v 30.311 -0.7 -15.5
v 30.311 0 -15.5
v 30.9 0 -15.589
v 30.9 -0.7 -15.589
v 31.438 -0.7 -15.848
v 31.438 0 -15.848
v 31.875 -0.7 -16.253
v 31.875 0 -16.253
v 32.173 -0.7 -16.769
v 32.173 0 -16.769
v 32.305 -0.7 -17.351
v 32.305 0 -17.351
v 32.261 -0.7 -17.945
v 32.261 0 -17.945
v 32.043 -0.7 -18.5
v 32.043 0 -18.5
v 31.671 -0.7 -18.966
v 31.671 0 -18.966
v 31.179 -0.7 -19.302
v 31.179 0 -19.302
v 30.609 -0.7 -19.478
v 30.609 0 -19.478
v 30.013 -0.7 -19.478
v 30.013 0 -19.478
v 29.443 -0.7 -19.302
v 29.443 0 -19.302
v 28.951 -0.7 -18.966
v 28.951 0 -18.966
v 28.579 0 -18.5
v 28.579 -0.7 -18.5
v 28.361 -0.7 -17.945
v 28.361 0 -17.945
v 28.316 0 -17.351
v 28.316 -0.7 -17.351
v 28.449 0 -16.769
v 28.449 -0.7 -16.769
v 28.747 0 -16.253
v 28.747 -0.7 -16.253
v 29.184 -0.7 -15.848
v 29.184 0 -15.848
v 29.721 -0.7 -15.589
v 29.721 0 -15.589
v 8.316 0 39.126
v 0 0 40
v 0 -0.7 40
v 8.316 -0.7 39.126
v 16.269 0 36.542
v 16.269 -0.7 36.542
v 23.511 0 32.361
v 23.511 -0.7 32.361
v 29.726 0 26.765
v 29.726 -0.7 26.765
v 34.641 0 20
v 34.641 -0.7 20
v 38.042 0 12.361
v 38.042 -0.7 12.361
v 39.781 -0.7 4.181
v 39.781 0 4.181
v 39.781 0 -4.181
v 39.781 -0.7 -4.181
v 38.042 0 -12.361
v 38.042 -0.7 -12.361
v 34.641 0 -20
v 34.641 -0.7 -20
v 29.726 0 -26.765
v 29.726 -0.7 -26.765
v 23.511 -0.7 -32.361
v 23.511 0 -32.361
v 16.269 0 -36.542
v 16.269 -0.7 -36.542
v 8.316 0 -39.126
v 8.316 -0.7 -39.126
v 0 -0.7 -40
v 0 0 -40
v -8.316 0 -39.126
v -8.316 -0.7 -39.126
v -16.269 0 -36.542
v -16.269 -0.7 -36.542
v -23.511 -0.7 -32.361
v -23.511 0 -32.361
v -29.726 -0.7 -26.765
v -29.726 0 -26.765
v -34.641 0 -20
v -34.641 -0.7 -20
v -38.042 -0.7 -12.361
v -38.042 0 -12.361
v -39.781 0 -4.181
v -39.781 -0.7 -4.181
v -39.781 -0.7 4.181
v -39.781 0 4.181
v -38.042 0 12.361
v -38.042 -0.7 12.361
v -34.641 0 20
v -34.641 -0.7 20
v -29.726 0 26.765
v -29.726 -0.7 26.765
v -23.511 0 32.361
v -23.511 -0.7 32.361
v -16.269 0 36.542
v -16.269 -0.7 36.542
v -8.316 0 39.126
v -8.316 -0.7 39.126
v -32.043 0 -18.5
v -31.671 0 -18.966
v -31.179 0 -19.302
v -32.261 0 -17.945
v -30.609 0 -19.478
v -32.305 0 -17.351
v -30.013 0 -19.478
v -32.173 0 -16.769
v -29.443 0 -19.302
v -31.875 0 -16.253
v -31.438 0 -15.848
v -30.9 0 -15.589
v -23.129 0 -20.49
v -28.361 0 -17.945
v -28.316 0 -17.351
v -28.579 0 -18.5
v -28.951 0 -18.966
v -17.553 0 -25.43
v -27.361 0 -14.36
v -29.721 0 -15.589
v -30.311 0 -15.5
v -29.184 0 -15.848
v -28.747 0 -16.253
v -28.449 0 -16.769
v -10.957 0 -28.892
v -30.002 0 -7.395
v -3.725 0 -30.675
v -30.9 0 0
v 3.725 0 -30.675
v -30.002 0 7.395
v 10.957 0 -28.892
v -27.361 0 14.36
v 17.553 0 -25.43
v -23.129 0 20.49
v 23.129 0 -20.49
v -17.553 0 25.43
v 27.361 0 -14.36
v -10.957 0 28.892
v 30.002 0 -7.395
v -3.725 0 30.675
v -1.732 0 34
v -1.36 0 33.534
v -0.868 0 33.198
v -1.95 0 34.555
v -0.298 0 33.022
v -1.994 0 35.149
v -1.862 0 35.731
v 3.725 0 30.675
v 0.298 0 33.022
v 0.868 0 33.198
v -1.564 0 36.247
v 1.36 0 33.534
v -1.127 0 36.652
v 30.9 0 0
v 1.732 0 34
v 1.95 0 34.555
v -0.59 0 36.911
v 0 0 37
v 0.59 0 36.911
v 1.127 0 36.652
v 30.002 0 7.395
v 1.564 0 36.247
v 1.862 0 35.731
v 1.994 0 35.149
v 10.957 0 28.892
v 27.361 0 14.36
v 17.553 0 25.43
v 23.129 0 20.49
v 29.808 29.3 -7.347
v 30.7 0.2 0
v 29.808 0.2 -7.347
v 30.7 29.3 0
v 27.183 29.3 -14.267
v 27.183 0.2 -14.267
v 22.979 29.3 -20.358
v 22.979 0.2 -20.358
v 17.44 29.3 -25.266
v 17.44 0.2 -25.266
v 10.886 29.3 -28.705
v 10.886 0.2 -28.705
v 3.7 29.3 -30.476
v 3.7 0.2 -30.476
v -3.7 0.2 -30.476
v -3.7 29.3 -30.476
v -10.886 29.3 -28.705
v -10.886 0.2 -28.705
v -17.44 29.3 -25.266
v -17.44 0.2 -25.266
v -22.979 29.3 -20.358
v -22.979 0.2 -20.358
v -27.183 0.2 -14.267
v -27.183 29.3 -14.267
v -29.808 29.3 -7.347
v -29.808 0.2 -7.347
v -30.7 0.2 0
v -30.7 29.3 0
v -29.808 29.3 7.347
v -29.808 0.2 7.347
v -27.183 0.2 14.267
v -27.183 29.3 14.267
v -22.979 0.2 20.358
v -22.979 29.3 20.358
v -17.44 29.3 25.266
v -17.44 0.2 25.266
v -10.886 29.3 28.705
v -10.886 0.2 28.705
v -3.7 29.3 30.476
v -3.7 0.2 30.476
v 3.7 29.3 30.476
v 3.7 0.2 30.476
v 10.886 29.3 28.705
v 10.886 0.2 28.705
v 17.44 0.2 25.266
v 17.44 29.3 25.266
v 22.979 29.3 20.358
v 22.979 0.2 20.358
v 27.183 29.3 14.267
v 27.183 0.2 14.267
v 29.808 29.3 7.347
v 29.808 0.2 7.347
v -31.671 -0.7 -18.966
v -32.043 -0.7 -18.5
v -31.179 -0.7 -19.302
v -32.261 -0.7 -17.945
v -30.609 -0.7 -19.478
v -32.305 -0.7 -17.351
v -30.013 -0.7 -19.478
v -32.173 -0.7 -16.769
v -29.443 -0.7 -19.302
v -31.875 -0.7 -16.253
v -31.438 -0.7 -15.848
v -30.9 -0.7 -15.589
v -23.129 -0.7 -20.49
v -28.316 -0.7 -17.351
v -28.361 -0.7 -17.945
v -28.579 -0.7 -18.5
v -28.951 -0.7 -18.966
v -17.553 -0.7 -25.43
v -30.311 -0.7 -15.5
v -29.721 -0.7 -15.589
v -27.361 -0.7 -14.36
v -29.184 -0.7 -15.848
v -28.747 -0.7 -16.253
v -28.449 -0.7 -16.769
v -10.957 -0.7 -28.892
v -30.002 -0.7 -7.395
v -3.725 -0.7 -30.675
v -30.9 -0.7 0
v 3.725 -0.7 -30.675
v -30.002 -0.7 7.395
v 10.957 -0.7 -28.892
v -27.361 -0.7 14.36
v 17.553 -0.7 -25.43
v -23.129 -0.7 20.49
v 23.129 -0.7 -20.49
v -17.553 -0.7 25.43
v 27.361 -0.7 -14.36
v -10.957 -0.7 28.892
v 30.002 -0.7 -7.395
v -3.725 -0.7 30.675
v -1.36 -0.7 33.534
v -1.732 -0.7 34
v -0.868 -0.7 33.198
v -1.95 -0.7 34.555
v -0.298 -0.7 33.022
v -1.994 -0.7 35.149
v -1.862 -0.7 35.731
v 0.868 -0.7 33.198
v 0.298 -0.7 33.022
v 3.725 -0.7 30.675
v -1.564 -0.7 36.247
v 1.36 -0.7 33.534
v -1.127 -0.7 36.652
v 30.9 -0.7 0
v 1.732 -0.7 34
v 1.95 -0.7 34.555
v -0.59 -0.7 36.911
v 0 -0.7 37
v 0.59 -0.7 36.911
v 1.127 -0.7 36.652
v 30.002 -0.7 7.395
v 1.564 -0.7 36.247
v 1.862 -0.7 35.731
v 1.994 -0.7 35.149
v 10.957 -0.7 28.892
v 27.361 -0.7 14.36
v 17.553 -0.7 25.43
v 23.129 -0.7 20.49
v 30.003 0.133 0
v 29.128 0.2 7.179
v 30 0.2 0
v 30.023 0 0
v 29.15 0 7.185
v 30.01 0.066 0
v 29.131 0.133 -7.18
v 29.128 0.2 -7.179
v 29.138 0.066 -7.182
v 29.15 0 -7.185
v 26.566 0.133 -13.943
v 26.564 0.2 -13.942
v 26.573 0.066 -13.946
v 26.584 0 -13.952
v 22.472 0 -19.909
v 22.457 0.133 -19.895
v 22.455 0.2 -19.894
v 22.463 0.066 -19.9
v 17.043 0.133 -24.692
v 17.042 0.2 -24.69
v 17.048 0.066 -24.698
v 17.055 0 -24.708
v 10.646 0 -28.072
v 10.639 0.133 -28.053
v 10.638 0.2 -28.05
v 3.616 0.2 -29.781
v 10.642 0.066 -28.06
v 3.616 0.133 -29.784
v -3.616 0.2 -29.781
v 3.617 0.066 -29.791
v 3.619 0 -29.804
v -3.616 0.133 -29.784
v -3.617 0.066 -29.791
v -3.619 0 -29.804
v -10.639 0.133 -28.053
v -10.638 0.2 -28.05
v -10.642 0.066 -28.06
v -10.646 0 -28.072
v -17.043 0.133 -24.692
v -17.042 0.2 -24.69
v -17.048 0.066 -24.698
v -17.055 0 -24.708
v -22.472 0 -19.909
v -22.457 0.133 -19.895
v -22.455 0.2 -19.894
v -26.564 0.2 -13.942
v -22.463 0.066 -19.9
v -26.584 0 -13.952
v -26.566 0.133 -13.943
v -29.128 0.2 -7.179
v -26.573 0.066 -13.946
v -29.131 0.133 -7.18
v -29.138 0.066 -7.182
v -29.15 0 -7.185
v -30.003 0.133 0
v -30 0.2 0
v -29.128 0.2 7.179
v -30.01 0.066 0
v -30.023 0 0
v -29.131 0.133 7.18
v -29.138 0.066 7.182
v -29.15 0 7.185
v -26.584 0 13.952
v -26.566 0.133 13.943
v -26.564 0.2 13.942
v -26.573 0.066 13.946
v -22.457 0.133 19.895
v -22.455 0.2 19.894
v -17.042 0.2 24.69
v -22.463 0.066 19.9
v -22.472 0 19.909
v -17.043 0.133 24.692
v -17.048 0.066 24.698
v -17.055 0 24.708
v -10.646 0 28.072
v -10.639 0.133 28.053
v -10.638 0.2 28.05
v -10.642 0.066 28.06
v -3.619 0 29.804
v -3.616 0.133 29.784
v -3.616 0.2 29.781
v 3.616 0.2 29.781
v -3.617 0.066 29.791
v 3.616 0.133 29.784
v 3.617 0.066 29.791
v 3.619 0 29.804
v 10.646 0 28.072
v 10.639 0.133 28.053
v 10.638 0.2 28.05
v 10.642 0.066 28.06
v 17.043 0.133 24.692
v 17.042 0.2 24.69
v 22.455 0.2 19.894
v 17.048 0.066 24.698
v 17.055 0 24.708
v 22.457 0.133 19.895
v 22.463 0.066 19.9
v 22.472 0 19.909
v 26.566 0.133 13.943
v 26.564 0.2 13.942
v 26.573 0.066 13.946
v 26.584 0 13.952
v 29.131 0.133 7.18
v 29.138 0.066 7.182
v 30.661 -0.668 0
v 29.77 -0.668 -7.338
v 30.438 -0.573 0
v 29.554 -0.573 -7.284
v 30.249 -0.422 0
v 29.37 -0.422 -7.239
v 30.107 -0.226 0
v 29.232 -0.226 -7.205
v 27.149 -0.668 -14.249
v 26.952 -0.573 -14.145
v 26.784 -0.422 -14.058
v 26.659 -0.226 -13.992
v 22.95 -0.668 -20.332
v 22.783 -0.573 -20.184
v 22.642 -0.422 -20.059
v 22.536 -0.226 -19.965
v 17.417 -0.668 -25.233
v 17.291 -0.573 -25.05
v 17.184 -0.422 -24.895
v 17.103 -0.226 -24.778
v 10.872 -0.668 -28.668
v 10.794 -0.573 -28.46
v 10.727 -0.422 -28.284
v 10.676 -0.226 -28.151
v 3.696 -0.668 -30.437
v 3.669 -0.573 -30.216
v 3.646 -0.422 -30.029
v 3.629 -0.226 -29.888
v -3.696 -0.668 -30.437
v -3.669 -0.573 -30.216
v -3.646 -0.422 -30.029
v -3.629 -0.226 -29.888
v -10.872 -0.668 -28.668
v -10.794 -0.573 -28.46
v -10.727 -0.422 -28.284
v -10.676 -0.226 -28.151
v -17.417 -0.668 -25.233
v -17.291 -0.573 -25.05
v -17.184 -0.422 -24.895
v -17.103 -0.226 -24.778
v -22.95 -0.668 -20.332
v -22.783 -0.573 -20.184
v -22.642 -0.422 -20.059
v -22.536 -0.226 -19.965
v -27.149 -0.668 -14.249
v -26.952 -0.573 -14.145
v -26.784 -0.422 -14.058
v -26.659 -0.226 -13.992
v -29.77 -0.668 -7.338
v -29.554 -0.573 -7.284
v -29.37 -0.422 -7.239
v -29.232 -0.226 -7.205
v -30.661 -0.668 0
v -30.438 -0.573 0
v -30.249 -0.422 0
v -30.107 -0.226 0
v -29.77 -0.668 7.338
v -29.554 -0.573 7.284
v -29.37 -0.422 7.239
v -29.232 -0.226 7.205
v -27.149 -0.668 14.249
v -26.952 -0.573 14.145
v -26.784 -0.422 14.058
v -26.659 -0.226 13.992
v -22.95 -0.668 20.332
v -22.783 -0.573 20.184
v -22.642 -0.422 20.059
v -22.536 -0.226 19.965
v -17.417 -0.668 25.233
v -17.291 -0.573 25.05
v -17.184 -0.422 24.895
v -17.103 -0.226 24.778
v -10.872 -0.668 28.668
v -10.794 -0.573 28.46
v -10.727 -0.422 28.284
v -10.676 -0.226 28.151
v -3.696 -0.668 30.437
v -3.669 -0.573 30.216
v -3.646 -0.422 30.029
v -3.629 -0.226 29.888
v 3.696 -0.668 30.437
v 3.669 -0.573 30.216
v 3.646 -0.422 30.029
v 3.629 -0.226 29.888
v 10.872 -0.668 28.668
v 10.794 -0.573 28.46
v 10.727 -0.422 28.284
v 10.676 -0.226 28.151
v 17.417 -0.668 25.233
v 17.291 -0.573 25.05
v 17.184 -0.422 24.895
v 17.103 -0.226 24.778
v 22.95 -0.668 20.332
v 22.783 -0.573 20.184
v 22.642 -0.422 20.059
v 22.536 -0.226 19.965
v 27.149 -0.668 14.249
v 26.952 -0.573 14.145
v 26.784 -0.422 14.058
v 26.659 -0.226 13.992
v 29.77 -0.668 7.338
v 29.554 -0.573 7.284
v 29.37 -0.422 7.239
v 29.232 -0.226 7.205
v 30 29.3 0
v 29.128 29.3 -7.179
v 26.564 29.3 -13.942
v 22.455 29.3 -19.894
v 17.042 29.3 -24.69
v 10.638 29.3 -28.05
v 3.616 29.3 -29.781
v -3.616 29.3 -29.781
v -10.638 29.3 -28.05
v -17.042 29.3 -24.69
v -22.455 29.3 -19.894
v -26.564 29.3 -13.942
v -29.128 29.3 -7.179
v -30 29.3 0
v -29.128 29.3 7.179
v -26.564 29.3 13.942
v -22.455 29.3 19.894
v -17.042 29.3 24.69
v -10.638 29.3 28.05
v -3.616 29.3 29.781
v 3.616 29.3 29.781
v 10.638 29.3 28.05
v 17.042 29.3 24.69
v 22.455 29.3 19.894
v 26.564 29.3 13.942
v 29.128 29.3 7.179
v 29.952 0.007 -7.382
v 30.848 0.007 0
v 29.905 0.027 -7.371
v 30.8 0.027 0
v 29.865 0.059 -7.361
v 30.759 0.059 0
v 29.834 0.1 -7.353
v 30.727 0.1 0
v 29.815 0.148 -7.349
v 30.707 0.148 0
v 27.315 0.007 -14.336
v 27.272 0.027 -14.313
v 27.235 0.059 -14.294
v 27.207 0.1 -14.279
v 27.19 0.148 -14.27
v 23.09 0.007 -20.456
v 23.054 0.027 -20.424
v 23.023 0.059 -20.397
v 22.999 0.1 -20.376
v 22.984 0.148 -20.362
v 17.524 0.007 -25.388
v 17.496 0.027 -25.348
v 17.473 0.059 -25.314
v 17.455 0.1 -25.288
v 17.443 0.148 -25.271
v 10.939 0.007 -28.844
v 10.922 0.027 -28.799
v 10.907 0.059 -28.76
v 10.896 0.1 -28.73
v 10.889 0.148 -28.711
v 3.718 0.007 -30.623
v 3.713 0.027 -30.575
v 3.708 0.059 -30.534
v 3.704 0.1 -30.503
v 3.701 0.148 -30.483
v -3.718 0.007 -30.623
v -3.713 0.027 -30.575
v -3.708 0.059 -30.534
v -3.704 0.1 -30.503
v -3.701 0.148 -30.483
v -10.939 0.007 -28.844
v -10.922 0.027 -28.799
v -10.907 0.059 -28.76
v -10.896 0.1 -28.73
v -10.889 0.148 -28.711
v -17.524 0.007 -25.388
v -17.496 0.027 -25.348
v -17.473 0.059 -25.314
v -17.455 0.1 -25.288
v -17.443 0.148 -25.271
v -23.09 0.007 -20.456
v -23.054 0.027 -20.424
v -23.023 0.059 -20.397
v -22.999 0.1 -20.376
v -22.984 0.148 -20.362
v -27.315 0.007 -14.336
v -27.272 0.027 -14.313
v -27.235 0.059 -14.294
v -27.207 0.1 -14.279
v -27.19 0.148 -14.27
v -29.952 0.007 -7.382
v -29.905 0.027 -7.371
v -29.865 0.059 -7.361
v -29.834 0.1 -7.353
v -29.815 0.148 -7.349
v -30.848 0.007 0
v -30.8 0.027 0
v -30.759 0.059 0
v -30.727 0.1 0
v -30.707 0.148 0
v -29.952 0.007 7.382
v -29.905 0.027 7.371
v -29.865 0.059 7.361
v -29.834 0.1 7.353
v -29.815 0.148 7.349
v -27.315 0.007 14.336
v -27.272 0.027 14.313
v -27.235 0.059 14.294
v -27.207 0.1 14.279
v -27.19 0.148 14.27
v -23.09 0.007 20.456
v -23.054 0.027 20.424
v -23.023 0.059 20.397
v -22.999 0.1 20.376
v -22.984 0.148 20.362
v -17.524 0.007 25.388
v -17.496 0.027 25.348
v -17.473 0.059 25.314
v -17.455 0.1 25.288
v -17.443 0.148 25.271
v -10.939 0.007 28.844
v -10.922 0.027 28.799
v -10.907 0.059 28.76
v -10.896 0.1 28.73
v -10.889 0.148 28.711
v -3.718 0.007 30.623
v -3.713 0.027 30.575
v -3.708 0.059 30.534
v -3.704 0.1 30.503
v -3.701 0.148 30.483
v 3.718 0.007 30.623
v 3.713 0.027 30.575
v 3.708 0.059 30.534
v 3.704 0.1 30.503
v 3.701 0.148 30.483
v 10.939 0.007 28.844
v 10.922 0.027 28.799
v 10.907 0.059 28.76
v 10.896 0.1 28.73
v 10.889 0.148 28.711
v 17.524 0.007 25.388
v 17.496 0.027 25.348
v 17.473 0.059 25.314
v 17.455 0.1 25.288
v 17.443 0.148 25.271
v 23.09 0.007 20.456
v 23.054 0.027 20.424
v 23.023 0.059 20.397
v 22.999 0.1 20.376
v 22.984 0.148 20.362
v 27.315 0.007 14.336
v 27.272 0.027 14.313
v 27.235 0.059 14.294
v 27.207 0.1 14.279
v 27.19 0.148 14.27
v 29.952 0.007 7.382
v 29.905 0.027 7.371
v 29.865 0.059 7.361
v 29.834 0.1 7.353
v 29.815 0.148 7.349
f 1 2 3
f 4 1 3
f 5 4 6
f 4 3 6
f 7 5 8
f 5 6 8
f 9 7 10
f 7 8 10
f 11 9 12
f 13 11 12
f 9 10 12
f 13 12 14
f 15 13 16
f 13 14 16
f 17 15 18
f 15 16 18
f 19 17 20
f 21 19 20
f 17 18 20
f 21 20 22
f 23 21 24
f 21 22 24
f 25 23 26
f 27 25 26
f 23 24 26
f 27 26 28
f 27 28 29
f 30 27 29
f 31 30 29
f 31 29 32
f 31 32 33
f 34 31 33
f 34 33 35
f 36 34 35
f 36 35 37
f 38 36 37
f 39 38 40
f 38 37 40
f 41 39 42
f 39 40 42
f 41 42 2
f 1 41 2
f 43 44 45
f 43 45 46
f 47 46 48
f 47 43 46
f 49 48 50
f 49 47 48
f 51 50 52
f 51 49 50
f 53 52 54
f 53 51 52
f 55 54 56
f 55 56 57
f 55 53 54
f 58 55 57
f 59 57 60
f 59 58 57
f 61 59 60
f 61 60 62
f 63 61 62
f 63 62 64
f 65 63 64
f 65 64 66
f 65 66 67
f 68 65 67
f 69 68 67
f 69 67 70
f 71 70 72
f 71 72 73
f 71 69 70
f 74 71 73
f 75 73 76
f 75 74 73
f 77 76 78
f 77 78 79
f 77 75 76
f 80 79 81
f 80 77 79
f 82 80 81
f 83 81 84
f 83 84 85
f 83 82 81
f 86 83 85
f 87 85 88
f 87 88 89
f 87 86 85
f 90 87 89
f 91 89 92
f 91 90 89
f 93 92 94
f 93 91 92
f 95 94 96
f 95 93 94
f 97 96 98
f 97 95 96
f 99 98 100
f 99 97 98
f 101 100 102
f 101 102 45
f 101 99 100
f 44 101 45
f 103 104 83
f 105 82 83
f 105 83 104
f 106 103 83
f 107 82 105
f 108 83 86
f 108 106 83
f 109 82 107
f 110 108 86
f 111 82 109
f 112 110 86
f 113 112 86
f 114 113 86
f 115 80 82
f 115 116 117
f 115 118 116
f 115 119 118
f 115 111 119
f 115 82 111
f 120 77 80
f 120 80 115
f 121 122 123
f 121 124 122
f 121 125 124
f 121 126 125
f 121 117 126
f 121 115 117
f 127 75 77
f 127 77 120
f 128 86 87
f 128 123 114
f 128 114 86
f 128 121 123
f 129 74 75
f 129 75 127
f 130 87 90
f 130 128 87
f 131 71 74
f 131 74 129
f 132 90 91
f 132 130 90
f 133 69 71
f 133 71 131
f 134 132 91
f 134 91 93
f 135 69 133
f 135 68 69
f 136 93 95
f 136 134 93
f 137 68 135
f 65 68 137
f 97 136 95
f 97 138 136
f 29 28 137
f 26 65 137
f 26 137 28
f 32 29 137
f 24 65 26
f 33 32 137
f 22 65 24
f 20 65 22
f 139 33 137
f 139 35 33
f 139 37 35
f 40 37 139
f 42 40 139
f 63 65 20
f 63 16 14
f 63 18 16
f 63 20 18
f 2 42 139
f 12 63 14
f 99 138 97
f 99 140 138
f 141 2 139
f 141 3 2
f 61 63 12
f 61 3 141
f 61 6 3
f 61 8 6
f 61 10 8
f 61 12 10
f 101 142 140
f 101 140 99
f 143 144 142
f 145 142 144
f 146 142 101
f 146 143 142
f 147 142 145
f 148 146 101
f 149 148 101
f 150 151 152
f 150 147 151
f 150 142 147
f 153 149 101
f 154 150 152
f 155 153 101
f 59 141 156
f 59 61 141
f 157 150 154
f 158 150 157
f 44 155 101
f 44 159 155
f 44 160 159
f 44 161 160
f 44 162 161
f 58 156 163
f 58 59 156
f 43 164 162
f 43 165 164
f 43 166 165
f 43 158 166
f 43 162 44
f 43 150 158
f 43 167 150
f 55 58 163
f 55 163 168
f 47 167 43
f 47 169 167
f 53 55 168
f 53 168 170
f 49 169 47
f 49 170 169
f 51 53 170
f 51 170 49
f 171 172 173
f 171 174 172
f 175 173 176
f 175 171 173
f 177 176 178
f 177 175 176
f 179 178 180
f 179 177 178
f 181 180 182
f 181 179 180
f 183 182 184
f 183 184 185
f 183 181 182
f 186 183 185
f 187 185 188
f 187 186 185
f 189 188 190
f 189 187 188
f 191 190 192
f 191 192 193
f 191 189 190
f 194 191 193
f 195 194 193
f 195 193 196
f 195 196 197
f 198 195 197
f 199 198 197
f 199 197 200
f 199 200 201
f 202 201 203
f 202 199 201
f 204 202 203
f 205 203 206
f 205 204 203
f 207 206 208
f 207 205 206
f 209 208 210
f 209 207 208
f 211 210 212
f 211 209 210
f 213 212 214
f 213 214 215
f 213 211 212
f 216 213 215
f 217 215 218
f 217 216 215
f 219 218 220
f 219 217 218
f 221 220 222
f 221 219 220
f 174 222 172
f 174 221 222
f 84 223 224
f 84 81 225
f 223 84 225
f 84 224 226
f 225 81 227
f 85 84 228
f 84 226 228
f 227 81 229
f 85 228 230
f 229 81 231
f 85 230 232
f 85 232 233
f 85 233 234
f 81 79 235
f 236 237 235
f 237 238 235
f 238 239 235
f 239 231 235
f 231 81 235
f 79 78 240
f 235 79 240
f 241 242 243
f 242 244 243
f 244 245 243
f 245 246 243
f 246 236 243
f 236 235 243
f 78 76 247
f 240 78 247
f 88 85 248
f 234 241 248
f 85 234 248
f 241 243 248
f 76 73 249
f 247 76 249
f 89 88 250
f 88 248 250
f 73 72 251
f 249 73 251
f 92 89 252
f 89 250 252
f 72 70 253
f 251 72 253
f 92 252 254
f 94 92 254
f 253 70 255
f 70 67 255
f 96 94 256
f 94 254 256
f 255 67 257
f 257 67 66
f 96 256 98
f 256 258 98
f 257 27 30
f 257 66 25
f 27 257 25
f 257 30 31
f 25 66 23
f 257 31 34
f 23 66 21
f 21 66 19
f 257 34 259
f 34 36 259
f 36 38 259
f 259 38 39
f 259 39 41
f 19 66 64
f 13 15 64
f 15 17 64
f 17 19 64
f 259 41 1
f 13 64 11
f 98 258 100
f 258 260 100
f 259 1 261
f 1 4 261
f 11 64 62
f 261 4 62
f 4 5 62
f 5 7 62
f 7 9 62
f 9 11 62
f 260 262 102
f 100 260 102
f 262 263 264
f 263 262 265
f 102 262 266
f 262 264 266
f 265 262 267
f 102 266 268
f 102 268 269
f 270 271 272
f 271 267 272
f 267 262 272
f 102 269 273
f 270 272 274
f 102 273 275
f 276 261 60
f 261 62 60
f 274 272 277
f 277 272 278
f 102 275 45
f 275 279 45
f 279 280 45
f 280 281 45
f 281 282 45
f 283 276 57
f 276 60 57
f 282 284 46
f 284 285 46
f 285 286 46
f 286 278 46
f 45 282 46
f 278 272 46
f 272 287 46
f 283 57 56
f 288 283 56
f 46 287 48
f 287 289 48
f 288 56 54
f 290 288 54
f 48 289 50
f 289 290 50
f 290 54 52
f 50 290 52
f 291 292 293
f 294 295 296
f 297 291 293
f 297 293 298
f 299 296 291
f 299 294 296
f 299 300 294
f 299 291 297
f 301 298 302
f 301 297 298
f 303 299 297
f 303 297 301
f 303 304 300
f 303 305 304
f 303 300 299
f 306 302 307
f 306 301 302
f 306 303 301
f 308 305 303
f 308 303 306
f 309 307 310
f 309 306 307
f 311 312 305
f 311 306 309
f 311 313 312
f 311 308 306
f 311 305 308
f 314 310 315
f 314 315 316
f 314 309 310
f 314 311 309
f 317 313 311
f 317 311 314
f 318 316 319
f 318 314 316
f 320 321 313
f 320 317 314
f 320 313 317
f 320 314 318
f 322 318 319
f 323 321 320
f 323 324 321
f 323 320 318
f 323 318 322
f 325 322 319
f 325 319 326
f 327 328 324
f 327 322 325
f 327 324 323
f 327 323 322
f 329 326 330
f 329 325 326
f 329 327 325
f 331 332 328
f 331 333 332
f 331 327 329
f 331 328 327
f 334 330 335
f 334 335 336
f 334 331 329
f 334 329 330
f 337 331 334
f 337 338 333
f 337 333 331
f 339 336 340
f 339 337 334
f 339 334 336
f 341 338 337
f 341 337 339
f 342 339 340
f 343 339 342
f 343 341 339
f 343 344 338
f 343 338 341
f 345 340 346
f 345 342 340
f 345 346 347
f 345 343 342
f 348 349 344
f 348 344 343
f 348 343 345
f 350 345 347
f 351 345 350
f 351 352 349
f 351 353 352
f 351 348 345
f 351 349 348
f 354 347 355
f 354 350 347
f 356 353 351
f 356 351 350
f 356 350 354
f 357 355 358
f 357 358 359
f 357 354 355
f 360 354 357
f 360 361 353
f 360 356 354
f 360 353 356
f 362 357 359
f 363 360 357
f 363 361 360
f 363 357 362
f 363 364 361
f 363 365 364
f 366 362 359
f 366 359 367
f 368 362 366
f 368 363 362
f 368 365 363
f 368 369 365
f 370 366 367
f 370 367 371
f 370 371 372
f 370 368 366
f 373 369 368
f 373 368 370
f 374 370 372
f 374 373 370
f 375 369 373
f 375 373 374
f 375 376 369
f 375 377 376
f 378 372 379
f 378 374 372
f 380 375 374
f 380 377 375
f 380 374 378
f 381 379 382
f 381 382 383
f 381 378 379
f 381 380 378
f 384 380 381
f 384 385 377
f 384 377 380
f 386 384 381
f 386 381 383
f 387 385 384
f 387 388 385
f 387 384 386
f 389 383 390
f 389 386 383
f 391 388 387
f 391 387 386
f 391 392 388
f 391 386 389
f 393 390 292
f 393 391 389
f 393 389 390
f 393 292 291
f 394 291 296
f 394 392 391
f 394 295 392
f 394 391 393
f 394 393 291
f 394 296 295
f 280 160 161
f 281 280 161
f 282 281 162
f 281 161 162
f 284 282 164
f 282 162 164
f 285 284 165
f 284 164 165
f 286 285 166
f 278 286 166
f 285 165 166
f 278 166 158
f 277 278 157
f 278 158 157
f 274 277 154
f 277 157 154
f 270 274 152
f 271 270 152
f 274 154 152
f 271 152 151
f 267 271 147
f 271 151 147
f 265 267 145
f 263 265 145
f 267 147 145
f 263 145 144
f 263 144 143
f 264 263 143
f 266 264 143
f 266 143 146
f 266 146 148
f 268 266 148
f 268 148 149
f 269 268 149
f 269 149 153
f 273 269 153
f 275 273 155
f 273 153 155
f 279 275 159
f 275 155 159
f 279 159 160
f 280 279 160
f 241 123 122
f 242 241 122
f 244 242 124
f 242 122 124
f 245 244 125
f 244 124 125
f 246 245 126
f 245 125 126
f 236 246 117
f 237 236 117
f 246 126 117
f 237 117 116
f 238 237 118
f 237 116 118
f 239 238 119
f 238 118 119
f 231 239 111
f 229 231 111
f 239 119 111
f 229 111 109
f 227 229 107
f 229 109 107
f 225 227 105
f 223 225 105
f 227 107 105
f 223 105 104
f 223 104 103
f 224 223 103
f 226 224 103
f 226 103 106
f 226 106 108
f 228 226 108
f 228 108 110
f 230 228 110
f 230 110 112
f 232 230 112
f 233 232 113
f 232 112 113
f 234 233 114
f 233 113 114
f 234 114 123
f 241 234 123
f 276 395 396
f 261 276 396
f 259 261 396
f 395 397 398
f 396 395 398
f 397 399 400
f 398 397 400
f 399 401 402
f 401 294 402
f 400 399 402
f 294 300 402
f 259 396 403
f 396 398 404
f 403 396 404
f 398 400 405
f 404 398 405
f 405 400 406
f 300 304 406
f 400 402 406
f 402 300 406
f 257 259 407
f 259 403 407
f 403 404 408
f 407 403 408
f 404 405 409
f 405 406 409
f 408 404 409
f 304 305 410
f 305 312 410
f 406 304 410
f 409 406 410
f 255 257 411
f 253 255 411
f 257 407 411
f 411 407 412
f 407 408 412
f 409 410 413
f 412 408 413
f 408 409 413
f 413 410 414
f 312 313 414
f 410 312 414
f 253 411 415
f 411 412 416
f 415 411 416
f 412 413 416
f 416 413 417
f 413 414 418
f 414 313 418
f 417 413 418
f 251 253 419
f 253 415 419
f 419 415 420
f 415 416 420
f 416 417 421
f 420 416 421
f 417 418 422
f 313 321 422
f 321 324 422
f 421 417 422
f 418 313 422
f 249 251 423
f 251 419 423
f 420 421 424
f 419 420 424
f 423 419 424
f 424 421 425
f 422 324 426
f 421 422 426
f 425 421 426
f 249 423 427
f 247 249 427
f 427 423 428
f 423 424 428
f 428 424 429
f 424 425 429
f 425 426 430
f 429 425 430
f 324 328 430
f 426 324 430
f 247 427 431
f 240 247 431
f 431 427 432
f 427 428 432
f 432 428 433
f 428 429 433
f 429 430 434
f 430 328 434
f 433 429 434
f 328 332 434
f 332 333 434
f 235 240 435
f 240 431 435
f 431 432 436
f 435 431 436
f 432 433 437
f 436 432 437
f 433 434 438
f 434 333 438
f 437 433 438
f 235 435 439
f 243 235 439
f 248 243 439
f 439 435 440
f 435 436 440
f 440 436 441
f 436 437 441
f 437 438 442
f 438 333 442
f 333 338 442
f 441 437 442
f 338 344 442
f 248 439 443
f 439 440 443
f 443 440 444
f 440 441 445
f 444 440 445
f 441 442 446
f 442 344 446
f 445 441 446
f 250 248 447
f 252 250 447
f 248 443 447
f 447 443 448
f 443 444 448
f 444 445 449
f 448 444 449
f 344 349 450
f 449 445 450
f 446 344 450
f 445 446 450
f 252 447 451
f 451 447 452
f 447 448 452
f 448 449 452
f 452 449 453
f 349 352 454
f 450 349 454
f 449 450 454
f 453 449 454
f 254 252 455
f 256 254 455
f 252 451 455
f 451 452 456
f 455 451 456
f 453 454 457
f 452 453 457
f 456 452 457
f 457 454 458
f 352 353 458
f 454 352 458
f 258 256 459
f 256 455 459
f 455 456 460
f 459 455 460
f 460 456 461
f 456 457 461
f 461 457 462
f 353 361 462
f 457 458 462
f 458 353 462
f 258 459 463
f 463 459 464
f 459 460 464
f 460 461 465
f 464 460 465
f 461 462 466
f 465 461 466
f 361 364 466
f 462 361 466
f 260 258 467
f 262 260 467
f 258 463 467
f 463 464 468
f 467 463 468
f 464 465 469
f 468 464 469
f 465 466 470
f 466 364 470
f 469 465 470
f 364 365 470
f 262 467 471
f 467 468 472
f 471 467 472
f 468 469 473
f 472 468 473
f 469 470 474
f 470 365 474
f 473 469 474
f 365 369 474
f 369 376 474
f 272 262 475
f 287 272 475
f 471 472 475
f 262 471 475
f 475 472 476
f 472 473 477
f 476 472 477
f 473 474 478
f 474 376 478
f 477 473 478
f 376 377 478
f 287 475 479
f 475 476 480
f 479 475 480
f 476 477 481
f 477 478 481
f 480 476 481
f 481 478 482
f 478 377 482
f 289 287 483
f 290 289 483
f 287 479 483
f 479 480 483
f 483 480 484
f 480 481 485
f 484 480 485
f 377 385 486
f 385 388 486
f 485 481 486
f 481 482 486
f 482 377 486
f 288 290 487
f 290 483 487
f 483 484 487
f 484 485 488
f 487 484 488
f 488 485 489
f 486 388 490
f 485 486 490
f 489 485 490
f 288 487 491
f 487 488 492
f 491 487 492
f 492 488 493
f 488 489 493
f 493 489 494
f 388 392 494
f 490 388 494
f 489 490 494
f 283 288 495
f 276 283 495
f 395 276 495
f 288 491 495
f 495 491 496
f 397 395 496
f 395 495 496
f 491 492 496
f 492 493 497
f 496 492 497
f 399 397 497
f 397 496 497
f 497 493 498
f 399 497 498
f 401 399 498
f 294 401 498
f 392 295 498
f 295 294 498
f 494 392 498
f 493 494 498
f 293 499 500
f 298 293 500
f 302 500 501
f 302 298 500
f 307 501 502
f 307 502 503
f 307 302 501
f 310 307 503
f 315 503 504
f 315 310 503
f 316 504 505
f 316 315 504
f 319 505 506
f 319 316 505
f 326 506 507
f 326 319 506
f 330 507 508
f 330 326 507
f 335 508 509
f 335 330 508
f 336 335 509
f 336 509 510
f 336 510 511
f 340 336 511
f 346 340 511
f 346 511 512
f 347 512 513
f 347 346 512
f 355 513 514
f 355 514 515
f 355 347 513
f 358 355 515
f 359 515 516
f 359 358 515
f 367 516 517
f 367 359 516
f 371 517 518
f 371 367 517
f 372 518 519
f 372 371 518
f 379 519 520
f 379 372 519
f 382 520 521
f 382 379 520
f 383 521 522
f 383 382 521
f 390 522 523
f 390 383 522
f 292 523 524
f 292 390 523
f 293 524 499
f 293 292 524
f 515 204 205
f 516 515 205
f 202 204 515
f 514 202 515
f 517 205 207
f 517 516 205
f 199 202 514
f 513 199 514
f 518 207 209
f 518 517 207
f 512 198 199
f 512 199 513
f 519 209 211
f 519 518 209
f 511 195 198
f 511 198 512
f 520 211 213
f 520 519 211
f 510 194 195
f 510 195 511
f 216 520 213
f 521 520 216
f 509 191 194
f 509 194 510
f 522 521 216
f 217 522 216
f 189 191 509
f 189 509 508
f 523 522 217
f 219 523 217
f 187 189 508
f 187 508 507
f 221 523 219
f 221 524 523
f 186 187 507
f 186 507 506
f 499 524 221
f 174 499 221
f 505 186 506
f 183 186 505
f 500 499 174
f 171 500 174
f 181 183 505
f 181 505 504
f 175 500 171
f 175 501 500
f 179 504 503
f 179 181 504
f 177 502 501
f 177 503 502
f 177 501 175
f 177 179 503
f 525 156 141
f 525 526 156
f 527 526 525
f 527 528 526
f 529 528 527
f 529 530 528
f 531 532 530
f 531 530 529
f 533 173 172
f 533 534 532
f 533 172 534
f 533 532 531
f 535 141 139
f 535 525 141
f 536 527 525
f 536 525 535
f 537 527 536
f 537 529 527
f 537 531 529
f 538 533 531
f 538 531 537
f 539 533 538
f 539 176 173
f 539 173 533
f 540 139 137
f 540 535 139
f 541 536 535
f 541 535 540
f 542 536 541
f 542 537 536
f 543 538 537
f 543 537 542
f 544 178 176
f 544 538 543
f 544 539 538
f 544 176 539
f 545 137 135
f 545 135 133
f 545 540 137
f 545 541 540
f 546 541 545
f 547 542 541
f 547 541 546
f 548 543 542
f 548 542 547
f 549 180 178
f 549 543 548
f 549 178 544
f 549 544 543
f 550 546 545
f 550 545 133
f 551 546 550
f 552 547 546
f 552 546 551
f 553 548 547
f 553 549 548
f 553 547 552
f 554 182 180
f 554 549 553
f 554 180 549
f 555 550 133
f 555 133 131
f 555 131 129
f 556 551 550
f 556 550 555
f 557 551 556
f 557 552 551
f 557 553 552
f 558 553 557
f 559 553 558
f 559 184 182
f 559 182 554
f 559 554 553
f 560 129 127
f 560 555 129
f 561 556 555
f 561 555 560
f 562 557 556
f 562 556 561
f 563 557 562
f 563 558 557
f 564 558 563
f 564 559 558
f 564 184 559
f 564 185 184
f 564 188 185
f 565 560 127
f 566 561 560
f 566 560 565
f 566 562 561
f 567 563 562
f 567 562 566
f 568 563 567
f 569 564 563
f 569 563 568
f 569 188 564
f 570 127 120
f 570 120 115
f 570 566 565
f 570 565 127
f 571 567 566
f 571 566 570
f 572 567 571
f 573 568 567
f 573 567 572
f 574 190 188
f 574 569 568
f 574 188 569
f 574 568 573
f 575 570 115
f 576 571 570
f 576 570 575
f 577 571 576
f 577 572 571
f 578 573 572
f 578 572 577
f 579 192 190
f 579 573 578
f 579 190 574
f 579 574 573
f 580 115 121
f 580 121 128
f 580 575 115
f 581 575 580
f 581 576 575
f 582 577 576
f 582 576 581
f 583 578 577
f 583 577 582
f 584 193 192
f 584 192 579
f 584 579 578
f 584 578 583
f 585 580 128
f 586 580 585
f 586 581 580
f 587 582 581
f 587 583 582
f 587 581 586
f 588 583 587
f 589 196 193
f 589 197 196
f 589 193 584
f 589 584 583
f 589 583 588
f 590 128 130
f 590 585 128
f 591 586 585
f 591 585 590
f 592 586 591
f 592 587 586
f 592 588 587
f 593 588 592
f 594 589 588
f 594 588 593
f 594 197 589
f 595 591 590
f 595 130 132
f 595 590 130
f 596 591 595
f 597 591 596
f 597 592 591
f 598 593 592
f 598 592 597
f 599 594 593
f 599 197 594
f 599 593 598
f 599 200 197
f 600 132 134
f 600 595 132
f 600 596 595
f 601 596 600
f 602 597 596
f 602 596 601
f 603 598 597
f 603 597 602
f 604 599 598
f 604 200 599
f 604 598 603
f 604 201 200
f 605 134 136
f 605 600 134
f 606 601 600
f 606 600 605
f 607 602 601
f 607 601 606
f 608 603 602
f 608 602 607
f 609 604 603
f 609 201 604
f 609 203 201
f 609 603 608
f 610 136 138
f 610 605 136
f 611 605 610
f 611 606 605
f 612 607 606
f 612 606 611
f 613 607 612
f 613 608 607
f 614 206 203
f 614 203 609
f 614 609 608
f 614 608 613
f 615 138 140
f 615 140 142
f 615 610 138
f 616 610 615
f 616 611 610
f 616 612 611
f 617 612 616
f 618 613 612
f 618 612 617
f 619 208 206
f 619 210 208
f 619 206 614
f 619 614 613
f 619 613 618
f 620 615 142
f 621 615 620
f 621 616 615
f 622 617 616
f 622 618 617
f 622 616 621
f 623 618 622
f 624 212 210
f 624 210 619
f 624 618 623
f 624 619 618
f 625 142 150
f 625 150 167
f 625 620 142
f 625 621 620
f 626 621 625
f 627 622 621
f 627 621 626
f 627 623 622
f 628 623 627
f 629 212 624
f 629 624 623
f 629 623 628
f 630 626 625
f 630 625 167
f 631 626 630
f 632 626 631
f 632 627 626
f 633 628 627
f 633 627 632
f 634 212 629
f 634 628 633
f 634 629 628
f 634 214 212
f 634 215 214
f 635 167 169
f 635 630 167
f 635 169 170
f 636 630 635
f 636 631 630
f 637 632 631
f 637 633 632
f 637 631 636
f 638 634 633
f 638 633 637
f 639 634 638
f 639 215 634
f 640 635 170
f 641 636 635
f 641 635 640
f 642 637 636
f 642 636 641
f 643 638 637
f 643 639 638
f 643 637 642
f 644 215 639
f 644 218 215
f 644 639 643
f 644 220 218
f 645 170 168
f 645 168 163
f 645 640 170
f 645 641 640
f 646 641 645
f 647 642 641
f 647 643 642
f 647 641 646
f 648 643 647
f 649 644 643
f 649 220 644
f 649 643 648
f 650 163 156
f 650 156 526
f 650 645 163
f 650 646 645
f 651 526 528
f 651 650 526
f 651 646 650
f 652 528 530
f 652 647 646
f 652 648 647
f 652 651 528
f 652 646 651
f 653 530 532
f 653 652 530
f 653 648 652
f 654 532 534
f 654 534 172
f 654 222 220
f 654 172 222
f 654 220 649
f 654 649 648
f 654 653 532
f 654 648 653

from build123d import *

# Parameters (mm, degrees)
SKETCH_1_R             = 40
SKETCH_1_R_2           = 30
SKETCH_1_R_3           = 2
SM_BASE_FLANGE_1_DEPTH = 0.7


# Read off the part's stored shape, not the designer's step: 边线-法兰2
# Sheet-metal steps are written as plain solids
with BuildPart() as part:
    # Sketch 1 → 基体-法兰1 (new body)
    with BuildSketch(Plane(origin=(0, 0, 0), x_dir=(1, 0, 0), z_dir=(0, 1, 0))):
        with Locations(Location((0, 0, 0), (0, 0, 270))):
            Circle(SKETCH_1_R)
        with Locations(Location((0, 0, 0), (0, 0, 270))):
            Circle(SKETCH_1_R_2, mode=Mode.SUBTRACT)
        with Locations(Location((-30.310889132, 17.5, 0), (0, 0, 270))):
            Circle(SKETCH_1_R_3, mode=Mode.SUBTRACT)
        with Locations(Location((0, -35, 0), (0, 0, 270))):
            Circle(SKETCH_1_R_3, mode=Mode.SUBTRACT)
        with Locations(Location((30.310889132, 17.5, 0), (0, 0, 270))):
            Circle(SKETCH_1_R_3, mode=Mode.SUBTRACT)
    extrude(amount=-SM_BASE_FLANGE_1_DEPTH)

    # 边线-法兰2 outline → 边线-法兰2 (revolve, cut)
    with BuildSketch(Plane.XY):
        with BuildLine():
            Line((30.022503561, 0), (30, 0))
            Line((30, 0), (30, -0.7))
            Line((30, -0.7), (30.9, -0.7))
            ThreePointArc((30.9, -0.7), (30.338751392, -0.503562364), (30.022503561, 0))
        make_face()
    revolve(axis=Axis((0, 0, 0), (0, 1, 0)), mode=Mode.SUBTRACT)

    # Sm Edge Flange 2 2 outline → Sm Edge Flange 2 2 (revolve)
    with BuildSketch(Plane.XY):
        with BuildLine():
            Line((30.7, 29.3), (30, 29.3))
            Line((30, 29.3), (30, 0.2))
            ThreePointArc((30, 0.2), (30.005643585, 0.099368978), (30.022503561, 0))
            Line((30.022503561, 0), (30.9, 0))
            ThreePointArc((30.9, 0), (30.758578644, 0.058578644), (30.7, 0.2))
            Line((30.7, 0.2), (30.7, 29.3))
        make_face()
    revolve(axis=Axis((0, 0, 0), (0, 1, 0)))


solid = part.part
